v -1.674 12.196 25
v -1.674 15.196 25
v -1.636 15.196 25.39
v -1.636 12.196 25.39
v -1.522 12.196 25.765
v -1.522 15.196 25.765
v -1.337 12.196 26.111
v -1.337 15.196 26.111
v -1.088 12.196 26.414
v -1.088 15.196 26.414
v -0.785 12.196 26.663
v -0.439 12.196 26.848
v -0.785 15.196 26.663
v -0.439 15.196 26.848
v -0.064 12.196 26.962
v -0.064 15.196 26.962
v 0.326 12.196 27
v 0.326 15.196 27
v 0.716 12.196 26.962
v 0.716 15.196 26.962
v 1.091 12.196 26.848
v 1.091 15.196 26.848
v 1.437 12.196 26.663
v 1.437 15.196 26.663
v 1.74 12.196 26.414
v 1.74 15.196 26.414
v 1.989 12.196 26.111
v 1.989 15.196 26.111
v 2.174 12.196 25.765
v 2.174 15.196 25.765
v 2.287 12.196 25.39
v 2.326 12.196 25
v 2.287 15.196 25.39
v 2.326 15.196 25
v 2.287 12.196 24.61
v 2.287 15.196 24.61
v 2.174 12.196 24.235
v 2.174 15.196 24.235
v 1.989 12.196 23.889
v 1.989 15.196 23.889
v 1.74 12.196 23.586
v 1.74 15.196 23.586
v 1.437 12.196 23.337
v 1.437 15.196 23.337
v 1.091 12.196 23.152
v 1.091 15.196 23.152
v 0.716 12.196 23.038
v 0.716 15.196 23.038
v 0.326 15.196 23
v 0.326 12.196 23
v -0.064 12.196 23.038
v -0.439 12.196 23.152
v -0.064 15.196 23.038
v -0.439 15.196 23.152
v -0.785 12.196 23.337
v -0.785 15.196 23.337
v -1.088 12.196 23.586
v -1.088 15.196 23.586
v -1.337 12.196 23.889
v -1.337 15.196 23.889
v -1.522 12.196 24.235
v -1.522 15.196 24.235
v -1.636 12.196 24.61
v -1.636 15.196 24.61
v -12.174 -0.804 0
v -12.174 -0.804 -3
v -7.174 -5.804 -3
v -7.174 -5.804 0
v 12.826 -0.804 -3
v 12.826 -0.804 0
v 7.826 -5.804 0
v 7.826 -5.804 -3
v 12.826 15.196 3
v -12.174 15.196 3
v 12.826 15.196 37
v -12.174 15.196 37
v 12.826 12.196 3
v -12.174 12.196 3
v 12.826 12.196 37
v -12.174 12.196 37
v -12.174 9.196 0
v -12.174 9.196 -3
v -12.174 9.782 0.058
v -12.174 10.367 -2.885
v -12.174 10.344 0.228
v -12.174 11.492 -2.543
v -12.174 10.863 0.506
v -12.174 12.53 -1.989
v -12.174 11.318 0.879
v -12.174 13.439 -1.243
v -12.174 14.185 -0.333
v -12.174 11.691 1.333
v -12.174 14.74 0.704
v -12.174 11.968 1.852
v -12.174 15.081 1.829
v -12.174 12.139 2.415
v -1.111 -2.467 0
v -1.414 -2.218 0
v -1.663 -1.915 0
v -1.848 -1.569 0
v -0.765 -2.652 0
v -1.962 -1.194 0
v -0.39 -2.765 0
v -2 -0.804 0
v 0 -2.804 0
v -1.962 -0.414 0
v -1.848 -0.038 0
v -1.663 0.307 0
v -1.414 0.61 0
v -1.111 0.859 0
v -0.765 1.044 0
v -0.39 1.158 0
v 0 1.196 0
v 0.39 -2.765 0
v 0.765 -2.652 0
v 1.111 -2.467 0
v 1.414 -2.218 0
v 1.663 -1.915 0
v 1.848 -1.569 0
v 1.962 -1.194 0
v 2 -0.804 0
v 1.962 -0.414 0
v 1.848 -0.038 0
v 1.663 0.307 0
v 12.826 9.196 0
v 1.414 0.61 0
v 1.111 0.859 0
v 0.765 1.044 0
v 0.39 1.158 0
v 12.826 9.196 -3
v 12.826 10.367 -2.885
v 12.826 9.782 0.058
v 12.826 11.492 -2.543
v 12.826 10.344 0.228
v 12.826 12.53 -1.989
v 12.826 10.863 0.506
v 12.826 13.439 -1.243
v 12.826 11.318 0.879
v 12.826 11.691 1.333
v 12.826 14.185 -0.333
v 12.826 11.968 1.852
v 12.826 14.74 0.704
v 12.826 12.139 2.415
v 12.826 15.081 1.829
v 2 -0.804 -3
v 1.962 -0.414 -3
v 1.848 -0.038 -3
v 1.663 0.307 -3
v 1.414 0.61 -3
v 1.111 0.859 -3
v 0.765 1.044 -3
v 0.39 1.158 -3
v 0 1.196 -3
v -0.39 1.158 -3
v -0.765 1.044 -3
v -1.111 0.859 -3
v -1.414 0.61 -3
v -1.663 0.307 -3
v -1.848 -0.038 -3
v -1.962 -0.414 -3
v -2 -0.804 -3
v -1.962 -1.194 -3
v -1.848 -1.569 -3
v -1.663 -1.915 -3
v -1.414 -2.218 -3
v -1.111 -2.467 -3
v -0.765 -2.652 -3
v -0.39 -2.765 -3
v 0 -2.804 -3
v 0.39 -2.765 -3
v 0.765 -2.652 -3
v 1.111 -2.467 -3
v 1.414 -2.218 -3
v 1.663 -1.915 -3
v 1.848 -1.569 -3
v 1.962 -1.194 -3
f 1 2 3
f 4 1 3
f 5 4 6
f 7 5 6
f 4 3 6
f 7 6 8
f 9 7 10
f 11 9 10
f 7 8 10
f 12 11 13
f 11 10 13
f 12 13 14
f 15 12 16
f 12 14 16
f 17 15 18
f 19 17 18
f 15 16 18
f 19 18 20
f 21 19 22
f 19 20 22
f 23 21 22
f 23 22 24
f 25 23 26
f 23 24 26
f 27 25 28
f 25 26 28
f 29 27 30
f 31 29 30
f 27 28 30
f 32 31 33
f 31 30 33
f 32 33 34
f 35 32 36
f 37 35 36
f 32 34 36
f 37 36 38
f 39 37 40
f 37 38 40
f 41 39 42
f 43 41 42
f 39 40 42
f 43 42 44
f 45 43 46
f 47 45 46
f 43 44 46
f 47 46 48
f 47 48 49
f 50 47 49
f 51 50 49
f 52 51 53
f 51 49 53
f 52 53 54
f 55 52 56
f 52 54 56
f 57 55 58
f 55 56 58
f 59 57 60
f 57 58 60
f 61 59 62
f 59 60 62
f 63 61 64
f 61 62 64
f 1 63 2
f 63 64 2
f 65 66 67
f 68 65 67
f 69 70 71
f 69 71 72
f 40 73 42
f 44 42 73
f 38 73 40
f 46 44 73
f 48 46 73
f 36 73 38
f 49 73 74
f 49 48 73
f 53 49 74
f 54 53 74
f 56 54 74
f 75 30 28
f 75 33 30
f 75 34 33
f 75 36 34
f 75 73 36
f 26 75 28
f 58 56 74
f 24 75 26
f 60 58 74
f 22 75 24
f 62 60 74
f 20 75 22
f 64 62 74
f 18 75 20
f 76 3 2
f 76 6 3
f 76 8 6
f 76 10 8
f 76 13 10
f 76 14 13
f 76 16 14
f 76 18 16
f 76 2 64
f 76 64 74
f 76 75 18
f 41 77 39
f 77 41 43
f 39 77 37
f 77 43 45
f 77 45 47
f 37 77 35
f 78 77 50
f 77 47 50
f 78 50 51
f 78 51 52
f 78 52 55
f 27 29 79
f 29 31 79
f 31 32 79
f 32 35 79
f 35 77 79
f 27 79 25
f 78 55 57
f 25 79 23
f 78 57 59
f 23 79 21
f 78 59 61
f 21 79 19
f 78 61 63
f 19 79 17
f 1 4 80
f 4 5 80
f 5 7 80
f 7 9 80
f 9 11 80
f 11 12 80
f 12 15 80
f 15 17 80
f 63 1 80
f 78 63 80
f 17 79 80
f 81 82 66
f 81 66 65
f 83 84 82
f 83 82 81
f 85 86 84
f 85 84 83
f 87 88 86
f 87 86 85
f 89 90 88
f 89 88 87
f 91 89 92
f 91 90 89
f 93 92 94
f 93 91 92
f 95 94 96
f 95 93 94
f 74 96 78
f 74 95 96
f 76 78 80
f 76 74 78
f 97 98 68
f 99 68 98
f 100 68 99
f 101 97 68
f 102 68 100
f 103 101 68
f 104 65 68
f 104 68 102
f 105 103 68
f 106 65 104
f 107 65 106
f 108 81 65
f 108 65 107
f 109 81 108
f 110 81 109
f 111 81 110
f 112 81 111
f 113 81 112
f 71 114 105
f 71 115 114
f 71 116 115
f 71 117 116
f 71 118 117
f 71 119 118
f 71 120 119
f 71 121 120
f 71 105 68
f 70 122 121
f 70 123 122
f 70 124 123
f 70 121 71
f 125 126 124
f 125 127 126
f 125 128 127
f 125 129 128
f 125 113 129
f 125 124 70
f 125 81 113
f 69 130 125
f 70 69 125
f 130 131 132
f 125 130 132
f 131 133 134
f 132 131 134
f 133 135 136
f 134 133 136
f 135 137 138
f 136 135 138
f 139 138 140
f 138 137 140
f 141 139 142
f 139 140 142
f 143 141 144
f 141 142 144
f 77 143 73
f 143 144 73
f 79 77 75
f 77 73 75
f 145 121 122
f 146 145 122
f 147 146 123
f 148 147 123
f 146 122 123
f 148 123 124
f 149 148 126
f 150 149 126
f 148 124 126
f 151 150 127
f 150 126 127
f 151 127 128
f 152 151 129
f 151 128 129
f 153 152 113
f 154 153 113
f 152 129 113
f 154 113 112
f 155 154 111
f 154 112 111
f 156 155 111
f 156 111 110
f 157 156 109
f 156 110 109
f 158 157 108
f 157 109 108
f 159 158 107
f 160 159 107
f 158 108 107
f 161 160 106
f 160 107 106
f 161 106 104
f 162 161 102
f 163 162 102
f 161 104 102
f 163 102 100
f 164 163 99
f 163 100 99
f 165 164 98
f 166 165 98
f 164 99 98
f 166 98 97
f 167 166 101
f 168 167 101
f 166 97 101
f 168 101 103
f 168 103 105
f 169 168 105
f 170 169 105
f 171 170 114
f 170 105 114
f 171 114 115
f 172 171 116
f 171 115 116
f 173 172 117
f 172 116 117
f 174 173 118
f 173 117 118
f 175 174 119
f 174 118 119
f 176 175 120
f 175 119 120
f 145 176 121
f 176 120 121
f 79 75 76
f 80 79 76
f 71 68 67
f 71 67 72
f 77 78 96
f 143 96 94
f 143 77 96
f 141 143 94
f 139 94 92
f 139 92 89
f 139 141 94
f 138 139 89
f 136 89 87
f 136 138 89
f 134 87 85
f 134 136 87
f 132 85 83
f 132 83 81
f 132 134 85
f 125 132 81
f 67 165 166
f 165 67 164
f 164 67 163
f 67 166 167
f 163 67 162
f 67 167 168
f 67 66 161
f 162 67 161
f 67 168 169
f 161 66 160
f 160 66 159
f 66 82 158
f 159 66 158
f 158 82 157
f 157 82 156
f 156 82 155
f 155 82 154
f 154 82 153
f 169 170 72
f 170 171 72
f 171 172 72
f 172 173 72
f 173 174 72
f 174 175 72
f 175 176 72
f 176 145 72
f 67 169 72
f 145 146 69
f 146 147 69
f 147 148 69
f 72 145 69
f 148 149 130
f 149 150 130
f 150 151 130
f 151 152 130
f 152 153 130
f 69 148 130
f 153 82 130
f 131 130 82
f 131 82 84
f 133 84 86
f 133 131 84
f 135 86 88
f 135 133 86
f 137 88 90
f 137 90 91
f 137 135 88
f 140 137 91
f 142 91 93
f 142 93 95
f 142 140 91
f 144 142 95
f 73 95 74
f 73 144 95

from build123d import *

# Parameters (mm, degrees)
SKETCH1_W                 = 25
SKETCH1_H                 = 15
SKETCH1_R                 = 2
BASE_FLANGE1_DEPTH        = 3
EDGE_FLANGE1_DEPTH        = 25
EDGE_FLANGE1_START        = 3
EDGE_FLANGE1_PROFILE_W    = 25
EDGE_FLANGE1_PROFILE_H    = 34
EDGE_FLANGE1_PROFILE_R    = 2
EDGE_FLANGE1_FLAT_DEPTH   = 3
BREAK_CORNER1_START       = -12.712257412
BREAK_CORNER1_OUTLINE_W   = 19.637623744
BREAK_CORNER1_OUTLINE_H   = 3
BREAK_CORNER1_DEPTH       = 3.535533905
BREAK_CORNER1_START_2     = 1.429878211
BREAK_CORNER1_2_OUTLINE_W = 4.362376256
BREAK_CORNER1_2_OUTLINE_H = 3
BREAK_CORNER1_2_DEPTH     = 7.071067812


# Read off the part's stored shape, not the designer's step: Break-Corner1
# Sheet-metal steps are written as plain solids
with BuildPart() as part:
    # Sketch1 → Base-Flange1 (new body)
    with BuildSketch(Plane.XY):
        with Locations((0.325905683, 1.696247476)):
            Rectangle(SKETCH1_W, SKETCH1_H)
        with Locations((0, -0.803752524)):
            Circle(SKETCH1_R, mode=Mode.SUBTRACT)
    extrude(amount=-BASE_FLANGE1_DEPTH)

    # Edge-Flange1 bend section (across the edge) → Edge-Flange1 (add)
    with BuildSketch(Plane(origin=(12.825905683, 12.196247476, 0), x_dir=(0, -1, 0), z_dir=(-1, 0, 0))):
        with BuildLine():
            Line((-3, 3), (0, 3))
            ThreePointArc((0, 3), (0.878679656, 0.878679656), (3, 0))
            Line((3, 0), (3, -3))
            ThreePointArc((3, -3), (-1.242640687, -1.242640687), (-3, 3))
        make_face()
    extrude(amount=EDGE_FLANGE1_DEPTH)

    # Edge-Flange1 profile (on flange) → Edge-Flange1 flat (add)
    with BuildSketch(Plane(origin=(0, 12.196247476, 0), x_dir=(-1, 0, 0), z_dir=(0, 1, 0)).offset(EDGE_FLANGE1_START)):
        with Locations((-0.325905683, 20)):
            Rectangle(EDGE_FLANGE1_PROFILE_W, EDGE_FLANGE1_PROFILE_H)
        with Locations((-0.325905683, 25)):
            Circle(EDGE_FLANGE1_PROFILE_R, mode=Mode.SUBTRACT)
    extrude(amount=-EDGE_FLANGE1_FLAT_DEPTH)

    # Break-Corner1 outline → Break-Corner1 (cut)
    with BuildSketch(Plane(origin=(0, 0, 0), x_dir=(0.707106781186548, -0.707106781186547, 0), z_dir=(0.707106781186547, 0.707106781186548, 0)).offset(BREAK_CORNER1_START)):
        with Locations((-0.181188128, 1.5)):
            Rectangle(BREAK_CORNER1_OUTLINE_W, BREAK_CORNER1_OUTLINE_H)
    extrude(amount=BREAK_CORNER1_DEPTH, mode=Mode.SUBTRACT)

    # Break-Corner1 2 outline → Break-Corner1 2 (cut)
    with BuildSketch(Plane(origin=(0, 0, 0), x_dir=(0.707106781186548, -0.707106781186547, 0), z_dir=(0.707106781186547, 0.707106781186548, 0)).offset(BREAK_CORNER1_START_2)):
        with Locations((11.818811872, 1.5)):
            Rectangle(BREAK_CORNER1_2_OUTLINE_W, BREAK_CORNER1_2_OUTLINE_H)
    extrude(amount=BREAK_CORNER1_2_DEPTH, mode=Mode.SUBTRACT)


solid = part.part
